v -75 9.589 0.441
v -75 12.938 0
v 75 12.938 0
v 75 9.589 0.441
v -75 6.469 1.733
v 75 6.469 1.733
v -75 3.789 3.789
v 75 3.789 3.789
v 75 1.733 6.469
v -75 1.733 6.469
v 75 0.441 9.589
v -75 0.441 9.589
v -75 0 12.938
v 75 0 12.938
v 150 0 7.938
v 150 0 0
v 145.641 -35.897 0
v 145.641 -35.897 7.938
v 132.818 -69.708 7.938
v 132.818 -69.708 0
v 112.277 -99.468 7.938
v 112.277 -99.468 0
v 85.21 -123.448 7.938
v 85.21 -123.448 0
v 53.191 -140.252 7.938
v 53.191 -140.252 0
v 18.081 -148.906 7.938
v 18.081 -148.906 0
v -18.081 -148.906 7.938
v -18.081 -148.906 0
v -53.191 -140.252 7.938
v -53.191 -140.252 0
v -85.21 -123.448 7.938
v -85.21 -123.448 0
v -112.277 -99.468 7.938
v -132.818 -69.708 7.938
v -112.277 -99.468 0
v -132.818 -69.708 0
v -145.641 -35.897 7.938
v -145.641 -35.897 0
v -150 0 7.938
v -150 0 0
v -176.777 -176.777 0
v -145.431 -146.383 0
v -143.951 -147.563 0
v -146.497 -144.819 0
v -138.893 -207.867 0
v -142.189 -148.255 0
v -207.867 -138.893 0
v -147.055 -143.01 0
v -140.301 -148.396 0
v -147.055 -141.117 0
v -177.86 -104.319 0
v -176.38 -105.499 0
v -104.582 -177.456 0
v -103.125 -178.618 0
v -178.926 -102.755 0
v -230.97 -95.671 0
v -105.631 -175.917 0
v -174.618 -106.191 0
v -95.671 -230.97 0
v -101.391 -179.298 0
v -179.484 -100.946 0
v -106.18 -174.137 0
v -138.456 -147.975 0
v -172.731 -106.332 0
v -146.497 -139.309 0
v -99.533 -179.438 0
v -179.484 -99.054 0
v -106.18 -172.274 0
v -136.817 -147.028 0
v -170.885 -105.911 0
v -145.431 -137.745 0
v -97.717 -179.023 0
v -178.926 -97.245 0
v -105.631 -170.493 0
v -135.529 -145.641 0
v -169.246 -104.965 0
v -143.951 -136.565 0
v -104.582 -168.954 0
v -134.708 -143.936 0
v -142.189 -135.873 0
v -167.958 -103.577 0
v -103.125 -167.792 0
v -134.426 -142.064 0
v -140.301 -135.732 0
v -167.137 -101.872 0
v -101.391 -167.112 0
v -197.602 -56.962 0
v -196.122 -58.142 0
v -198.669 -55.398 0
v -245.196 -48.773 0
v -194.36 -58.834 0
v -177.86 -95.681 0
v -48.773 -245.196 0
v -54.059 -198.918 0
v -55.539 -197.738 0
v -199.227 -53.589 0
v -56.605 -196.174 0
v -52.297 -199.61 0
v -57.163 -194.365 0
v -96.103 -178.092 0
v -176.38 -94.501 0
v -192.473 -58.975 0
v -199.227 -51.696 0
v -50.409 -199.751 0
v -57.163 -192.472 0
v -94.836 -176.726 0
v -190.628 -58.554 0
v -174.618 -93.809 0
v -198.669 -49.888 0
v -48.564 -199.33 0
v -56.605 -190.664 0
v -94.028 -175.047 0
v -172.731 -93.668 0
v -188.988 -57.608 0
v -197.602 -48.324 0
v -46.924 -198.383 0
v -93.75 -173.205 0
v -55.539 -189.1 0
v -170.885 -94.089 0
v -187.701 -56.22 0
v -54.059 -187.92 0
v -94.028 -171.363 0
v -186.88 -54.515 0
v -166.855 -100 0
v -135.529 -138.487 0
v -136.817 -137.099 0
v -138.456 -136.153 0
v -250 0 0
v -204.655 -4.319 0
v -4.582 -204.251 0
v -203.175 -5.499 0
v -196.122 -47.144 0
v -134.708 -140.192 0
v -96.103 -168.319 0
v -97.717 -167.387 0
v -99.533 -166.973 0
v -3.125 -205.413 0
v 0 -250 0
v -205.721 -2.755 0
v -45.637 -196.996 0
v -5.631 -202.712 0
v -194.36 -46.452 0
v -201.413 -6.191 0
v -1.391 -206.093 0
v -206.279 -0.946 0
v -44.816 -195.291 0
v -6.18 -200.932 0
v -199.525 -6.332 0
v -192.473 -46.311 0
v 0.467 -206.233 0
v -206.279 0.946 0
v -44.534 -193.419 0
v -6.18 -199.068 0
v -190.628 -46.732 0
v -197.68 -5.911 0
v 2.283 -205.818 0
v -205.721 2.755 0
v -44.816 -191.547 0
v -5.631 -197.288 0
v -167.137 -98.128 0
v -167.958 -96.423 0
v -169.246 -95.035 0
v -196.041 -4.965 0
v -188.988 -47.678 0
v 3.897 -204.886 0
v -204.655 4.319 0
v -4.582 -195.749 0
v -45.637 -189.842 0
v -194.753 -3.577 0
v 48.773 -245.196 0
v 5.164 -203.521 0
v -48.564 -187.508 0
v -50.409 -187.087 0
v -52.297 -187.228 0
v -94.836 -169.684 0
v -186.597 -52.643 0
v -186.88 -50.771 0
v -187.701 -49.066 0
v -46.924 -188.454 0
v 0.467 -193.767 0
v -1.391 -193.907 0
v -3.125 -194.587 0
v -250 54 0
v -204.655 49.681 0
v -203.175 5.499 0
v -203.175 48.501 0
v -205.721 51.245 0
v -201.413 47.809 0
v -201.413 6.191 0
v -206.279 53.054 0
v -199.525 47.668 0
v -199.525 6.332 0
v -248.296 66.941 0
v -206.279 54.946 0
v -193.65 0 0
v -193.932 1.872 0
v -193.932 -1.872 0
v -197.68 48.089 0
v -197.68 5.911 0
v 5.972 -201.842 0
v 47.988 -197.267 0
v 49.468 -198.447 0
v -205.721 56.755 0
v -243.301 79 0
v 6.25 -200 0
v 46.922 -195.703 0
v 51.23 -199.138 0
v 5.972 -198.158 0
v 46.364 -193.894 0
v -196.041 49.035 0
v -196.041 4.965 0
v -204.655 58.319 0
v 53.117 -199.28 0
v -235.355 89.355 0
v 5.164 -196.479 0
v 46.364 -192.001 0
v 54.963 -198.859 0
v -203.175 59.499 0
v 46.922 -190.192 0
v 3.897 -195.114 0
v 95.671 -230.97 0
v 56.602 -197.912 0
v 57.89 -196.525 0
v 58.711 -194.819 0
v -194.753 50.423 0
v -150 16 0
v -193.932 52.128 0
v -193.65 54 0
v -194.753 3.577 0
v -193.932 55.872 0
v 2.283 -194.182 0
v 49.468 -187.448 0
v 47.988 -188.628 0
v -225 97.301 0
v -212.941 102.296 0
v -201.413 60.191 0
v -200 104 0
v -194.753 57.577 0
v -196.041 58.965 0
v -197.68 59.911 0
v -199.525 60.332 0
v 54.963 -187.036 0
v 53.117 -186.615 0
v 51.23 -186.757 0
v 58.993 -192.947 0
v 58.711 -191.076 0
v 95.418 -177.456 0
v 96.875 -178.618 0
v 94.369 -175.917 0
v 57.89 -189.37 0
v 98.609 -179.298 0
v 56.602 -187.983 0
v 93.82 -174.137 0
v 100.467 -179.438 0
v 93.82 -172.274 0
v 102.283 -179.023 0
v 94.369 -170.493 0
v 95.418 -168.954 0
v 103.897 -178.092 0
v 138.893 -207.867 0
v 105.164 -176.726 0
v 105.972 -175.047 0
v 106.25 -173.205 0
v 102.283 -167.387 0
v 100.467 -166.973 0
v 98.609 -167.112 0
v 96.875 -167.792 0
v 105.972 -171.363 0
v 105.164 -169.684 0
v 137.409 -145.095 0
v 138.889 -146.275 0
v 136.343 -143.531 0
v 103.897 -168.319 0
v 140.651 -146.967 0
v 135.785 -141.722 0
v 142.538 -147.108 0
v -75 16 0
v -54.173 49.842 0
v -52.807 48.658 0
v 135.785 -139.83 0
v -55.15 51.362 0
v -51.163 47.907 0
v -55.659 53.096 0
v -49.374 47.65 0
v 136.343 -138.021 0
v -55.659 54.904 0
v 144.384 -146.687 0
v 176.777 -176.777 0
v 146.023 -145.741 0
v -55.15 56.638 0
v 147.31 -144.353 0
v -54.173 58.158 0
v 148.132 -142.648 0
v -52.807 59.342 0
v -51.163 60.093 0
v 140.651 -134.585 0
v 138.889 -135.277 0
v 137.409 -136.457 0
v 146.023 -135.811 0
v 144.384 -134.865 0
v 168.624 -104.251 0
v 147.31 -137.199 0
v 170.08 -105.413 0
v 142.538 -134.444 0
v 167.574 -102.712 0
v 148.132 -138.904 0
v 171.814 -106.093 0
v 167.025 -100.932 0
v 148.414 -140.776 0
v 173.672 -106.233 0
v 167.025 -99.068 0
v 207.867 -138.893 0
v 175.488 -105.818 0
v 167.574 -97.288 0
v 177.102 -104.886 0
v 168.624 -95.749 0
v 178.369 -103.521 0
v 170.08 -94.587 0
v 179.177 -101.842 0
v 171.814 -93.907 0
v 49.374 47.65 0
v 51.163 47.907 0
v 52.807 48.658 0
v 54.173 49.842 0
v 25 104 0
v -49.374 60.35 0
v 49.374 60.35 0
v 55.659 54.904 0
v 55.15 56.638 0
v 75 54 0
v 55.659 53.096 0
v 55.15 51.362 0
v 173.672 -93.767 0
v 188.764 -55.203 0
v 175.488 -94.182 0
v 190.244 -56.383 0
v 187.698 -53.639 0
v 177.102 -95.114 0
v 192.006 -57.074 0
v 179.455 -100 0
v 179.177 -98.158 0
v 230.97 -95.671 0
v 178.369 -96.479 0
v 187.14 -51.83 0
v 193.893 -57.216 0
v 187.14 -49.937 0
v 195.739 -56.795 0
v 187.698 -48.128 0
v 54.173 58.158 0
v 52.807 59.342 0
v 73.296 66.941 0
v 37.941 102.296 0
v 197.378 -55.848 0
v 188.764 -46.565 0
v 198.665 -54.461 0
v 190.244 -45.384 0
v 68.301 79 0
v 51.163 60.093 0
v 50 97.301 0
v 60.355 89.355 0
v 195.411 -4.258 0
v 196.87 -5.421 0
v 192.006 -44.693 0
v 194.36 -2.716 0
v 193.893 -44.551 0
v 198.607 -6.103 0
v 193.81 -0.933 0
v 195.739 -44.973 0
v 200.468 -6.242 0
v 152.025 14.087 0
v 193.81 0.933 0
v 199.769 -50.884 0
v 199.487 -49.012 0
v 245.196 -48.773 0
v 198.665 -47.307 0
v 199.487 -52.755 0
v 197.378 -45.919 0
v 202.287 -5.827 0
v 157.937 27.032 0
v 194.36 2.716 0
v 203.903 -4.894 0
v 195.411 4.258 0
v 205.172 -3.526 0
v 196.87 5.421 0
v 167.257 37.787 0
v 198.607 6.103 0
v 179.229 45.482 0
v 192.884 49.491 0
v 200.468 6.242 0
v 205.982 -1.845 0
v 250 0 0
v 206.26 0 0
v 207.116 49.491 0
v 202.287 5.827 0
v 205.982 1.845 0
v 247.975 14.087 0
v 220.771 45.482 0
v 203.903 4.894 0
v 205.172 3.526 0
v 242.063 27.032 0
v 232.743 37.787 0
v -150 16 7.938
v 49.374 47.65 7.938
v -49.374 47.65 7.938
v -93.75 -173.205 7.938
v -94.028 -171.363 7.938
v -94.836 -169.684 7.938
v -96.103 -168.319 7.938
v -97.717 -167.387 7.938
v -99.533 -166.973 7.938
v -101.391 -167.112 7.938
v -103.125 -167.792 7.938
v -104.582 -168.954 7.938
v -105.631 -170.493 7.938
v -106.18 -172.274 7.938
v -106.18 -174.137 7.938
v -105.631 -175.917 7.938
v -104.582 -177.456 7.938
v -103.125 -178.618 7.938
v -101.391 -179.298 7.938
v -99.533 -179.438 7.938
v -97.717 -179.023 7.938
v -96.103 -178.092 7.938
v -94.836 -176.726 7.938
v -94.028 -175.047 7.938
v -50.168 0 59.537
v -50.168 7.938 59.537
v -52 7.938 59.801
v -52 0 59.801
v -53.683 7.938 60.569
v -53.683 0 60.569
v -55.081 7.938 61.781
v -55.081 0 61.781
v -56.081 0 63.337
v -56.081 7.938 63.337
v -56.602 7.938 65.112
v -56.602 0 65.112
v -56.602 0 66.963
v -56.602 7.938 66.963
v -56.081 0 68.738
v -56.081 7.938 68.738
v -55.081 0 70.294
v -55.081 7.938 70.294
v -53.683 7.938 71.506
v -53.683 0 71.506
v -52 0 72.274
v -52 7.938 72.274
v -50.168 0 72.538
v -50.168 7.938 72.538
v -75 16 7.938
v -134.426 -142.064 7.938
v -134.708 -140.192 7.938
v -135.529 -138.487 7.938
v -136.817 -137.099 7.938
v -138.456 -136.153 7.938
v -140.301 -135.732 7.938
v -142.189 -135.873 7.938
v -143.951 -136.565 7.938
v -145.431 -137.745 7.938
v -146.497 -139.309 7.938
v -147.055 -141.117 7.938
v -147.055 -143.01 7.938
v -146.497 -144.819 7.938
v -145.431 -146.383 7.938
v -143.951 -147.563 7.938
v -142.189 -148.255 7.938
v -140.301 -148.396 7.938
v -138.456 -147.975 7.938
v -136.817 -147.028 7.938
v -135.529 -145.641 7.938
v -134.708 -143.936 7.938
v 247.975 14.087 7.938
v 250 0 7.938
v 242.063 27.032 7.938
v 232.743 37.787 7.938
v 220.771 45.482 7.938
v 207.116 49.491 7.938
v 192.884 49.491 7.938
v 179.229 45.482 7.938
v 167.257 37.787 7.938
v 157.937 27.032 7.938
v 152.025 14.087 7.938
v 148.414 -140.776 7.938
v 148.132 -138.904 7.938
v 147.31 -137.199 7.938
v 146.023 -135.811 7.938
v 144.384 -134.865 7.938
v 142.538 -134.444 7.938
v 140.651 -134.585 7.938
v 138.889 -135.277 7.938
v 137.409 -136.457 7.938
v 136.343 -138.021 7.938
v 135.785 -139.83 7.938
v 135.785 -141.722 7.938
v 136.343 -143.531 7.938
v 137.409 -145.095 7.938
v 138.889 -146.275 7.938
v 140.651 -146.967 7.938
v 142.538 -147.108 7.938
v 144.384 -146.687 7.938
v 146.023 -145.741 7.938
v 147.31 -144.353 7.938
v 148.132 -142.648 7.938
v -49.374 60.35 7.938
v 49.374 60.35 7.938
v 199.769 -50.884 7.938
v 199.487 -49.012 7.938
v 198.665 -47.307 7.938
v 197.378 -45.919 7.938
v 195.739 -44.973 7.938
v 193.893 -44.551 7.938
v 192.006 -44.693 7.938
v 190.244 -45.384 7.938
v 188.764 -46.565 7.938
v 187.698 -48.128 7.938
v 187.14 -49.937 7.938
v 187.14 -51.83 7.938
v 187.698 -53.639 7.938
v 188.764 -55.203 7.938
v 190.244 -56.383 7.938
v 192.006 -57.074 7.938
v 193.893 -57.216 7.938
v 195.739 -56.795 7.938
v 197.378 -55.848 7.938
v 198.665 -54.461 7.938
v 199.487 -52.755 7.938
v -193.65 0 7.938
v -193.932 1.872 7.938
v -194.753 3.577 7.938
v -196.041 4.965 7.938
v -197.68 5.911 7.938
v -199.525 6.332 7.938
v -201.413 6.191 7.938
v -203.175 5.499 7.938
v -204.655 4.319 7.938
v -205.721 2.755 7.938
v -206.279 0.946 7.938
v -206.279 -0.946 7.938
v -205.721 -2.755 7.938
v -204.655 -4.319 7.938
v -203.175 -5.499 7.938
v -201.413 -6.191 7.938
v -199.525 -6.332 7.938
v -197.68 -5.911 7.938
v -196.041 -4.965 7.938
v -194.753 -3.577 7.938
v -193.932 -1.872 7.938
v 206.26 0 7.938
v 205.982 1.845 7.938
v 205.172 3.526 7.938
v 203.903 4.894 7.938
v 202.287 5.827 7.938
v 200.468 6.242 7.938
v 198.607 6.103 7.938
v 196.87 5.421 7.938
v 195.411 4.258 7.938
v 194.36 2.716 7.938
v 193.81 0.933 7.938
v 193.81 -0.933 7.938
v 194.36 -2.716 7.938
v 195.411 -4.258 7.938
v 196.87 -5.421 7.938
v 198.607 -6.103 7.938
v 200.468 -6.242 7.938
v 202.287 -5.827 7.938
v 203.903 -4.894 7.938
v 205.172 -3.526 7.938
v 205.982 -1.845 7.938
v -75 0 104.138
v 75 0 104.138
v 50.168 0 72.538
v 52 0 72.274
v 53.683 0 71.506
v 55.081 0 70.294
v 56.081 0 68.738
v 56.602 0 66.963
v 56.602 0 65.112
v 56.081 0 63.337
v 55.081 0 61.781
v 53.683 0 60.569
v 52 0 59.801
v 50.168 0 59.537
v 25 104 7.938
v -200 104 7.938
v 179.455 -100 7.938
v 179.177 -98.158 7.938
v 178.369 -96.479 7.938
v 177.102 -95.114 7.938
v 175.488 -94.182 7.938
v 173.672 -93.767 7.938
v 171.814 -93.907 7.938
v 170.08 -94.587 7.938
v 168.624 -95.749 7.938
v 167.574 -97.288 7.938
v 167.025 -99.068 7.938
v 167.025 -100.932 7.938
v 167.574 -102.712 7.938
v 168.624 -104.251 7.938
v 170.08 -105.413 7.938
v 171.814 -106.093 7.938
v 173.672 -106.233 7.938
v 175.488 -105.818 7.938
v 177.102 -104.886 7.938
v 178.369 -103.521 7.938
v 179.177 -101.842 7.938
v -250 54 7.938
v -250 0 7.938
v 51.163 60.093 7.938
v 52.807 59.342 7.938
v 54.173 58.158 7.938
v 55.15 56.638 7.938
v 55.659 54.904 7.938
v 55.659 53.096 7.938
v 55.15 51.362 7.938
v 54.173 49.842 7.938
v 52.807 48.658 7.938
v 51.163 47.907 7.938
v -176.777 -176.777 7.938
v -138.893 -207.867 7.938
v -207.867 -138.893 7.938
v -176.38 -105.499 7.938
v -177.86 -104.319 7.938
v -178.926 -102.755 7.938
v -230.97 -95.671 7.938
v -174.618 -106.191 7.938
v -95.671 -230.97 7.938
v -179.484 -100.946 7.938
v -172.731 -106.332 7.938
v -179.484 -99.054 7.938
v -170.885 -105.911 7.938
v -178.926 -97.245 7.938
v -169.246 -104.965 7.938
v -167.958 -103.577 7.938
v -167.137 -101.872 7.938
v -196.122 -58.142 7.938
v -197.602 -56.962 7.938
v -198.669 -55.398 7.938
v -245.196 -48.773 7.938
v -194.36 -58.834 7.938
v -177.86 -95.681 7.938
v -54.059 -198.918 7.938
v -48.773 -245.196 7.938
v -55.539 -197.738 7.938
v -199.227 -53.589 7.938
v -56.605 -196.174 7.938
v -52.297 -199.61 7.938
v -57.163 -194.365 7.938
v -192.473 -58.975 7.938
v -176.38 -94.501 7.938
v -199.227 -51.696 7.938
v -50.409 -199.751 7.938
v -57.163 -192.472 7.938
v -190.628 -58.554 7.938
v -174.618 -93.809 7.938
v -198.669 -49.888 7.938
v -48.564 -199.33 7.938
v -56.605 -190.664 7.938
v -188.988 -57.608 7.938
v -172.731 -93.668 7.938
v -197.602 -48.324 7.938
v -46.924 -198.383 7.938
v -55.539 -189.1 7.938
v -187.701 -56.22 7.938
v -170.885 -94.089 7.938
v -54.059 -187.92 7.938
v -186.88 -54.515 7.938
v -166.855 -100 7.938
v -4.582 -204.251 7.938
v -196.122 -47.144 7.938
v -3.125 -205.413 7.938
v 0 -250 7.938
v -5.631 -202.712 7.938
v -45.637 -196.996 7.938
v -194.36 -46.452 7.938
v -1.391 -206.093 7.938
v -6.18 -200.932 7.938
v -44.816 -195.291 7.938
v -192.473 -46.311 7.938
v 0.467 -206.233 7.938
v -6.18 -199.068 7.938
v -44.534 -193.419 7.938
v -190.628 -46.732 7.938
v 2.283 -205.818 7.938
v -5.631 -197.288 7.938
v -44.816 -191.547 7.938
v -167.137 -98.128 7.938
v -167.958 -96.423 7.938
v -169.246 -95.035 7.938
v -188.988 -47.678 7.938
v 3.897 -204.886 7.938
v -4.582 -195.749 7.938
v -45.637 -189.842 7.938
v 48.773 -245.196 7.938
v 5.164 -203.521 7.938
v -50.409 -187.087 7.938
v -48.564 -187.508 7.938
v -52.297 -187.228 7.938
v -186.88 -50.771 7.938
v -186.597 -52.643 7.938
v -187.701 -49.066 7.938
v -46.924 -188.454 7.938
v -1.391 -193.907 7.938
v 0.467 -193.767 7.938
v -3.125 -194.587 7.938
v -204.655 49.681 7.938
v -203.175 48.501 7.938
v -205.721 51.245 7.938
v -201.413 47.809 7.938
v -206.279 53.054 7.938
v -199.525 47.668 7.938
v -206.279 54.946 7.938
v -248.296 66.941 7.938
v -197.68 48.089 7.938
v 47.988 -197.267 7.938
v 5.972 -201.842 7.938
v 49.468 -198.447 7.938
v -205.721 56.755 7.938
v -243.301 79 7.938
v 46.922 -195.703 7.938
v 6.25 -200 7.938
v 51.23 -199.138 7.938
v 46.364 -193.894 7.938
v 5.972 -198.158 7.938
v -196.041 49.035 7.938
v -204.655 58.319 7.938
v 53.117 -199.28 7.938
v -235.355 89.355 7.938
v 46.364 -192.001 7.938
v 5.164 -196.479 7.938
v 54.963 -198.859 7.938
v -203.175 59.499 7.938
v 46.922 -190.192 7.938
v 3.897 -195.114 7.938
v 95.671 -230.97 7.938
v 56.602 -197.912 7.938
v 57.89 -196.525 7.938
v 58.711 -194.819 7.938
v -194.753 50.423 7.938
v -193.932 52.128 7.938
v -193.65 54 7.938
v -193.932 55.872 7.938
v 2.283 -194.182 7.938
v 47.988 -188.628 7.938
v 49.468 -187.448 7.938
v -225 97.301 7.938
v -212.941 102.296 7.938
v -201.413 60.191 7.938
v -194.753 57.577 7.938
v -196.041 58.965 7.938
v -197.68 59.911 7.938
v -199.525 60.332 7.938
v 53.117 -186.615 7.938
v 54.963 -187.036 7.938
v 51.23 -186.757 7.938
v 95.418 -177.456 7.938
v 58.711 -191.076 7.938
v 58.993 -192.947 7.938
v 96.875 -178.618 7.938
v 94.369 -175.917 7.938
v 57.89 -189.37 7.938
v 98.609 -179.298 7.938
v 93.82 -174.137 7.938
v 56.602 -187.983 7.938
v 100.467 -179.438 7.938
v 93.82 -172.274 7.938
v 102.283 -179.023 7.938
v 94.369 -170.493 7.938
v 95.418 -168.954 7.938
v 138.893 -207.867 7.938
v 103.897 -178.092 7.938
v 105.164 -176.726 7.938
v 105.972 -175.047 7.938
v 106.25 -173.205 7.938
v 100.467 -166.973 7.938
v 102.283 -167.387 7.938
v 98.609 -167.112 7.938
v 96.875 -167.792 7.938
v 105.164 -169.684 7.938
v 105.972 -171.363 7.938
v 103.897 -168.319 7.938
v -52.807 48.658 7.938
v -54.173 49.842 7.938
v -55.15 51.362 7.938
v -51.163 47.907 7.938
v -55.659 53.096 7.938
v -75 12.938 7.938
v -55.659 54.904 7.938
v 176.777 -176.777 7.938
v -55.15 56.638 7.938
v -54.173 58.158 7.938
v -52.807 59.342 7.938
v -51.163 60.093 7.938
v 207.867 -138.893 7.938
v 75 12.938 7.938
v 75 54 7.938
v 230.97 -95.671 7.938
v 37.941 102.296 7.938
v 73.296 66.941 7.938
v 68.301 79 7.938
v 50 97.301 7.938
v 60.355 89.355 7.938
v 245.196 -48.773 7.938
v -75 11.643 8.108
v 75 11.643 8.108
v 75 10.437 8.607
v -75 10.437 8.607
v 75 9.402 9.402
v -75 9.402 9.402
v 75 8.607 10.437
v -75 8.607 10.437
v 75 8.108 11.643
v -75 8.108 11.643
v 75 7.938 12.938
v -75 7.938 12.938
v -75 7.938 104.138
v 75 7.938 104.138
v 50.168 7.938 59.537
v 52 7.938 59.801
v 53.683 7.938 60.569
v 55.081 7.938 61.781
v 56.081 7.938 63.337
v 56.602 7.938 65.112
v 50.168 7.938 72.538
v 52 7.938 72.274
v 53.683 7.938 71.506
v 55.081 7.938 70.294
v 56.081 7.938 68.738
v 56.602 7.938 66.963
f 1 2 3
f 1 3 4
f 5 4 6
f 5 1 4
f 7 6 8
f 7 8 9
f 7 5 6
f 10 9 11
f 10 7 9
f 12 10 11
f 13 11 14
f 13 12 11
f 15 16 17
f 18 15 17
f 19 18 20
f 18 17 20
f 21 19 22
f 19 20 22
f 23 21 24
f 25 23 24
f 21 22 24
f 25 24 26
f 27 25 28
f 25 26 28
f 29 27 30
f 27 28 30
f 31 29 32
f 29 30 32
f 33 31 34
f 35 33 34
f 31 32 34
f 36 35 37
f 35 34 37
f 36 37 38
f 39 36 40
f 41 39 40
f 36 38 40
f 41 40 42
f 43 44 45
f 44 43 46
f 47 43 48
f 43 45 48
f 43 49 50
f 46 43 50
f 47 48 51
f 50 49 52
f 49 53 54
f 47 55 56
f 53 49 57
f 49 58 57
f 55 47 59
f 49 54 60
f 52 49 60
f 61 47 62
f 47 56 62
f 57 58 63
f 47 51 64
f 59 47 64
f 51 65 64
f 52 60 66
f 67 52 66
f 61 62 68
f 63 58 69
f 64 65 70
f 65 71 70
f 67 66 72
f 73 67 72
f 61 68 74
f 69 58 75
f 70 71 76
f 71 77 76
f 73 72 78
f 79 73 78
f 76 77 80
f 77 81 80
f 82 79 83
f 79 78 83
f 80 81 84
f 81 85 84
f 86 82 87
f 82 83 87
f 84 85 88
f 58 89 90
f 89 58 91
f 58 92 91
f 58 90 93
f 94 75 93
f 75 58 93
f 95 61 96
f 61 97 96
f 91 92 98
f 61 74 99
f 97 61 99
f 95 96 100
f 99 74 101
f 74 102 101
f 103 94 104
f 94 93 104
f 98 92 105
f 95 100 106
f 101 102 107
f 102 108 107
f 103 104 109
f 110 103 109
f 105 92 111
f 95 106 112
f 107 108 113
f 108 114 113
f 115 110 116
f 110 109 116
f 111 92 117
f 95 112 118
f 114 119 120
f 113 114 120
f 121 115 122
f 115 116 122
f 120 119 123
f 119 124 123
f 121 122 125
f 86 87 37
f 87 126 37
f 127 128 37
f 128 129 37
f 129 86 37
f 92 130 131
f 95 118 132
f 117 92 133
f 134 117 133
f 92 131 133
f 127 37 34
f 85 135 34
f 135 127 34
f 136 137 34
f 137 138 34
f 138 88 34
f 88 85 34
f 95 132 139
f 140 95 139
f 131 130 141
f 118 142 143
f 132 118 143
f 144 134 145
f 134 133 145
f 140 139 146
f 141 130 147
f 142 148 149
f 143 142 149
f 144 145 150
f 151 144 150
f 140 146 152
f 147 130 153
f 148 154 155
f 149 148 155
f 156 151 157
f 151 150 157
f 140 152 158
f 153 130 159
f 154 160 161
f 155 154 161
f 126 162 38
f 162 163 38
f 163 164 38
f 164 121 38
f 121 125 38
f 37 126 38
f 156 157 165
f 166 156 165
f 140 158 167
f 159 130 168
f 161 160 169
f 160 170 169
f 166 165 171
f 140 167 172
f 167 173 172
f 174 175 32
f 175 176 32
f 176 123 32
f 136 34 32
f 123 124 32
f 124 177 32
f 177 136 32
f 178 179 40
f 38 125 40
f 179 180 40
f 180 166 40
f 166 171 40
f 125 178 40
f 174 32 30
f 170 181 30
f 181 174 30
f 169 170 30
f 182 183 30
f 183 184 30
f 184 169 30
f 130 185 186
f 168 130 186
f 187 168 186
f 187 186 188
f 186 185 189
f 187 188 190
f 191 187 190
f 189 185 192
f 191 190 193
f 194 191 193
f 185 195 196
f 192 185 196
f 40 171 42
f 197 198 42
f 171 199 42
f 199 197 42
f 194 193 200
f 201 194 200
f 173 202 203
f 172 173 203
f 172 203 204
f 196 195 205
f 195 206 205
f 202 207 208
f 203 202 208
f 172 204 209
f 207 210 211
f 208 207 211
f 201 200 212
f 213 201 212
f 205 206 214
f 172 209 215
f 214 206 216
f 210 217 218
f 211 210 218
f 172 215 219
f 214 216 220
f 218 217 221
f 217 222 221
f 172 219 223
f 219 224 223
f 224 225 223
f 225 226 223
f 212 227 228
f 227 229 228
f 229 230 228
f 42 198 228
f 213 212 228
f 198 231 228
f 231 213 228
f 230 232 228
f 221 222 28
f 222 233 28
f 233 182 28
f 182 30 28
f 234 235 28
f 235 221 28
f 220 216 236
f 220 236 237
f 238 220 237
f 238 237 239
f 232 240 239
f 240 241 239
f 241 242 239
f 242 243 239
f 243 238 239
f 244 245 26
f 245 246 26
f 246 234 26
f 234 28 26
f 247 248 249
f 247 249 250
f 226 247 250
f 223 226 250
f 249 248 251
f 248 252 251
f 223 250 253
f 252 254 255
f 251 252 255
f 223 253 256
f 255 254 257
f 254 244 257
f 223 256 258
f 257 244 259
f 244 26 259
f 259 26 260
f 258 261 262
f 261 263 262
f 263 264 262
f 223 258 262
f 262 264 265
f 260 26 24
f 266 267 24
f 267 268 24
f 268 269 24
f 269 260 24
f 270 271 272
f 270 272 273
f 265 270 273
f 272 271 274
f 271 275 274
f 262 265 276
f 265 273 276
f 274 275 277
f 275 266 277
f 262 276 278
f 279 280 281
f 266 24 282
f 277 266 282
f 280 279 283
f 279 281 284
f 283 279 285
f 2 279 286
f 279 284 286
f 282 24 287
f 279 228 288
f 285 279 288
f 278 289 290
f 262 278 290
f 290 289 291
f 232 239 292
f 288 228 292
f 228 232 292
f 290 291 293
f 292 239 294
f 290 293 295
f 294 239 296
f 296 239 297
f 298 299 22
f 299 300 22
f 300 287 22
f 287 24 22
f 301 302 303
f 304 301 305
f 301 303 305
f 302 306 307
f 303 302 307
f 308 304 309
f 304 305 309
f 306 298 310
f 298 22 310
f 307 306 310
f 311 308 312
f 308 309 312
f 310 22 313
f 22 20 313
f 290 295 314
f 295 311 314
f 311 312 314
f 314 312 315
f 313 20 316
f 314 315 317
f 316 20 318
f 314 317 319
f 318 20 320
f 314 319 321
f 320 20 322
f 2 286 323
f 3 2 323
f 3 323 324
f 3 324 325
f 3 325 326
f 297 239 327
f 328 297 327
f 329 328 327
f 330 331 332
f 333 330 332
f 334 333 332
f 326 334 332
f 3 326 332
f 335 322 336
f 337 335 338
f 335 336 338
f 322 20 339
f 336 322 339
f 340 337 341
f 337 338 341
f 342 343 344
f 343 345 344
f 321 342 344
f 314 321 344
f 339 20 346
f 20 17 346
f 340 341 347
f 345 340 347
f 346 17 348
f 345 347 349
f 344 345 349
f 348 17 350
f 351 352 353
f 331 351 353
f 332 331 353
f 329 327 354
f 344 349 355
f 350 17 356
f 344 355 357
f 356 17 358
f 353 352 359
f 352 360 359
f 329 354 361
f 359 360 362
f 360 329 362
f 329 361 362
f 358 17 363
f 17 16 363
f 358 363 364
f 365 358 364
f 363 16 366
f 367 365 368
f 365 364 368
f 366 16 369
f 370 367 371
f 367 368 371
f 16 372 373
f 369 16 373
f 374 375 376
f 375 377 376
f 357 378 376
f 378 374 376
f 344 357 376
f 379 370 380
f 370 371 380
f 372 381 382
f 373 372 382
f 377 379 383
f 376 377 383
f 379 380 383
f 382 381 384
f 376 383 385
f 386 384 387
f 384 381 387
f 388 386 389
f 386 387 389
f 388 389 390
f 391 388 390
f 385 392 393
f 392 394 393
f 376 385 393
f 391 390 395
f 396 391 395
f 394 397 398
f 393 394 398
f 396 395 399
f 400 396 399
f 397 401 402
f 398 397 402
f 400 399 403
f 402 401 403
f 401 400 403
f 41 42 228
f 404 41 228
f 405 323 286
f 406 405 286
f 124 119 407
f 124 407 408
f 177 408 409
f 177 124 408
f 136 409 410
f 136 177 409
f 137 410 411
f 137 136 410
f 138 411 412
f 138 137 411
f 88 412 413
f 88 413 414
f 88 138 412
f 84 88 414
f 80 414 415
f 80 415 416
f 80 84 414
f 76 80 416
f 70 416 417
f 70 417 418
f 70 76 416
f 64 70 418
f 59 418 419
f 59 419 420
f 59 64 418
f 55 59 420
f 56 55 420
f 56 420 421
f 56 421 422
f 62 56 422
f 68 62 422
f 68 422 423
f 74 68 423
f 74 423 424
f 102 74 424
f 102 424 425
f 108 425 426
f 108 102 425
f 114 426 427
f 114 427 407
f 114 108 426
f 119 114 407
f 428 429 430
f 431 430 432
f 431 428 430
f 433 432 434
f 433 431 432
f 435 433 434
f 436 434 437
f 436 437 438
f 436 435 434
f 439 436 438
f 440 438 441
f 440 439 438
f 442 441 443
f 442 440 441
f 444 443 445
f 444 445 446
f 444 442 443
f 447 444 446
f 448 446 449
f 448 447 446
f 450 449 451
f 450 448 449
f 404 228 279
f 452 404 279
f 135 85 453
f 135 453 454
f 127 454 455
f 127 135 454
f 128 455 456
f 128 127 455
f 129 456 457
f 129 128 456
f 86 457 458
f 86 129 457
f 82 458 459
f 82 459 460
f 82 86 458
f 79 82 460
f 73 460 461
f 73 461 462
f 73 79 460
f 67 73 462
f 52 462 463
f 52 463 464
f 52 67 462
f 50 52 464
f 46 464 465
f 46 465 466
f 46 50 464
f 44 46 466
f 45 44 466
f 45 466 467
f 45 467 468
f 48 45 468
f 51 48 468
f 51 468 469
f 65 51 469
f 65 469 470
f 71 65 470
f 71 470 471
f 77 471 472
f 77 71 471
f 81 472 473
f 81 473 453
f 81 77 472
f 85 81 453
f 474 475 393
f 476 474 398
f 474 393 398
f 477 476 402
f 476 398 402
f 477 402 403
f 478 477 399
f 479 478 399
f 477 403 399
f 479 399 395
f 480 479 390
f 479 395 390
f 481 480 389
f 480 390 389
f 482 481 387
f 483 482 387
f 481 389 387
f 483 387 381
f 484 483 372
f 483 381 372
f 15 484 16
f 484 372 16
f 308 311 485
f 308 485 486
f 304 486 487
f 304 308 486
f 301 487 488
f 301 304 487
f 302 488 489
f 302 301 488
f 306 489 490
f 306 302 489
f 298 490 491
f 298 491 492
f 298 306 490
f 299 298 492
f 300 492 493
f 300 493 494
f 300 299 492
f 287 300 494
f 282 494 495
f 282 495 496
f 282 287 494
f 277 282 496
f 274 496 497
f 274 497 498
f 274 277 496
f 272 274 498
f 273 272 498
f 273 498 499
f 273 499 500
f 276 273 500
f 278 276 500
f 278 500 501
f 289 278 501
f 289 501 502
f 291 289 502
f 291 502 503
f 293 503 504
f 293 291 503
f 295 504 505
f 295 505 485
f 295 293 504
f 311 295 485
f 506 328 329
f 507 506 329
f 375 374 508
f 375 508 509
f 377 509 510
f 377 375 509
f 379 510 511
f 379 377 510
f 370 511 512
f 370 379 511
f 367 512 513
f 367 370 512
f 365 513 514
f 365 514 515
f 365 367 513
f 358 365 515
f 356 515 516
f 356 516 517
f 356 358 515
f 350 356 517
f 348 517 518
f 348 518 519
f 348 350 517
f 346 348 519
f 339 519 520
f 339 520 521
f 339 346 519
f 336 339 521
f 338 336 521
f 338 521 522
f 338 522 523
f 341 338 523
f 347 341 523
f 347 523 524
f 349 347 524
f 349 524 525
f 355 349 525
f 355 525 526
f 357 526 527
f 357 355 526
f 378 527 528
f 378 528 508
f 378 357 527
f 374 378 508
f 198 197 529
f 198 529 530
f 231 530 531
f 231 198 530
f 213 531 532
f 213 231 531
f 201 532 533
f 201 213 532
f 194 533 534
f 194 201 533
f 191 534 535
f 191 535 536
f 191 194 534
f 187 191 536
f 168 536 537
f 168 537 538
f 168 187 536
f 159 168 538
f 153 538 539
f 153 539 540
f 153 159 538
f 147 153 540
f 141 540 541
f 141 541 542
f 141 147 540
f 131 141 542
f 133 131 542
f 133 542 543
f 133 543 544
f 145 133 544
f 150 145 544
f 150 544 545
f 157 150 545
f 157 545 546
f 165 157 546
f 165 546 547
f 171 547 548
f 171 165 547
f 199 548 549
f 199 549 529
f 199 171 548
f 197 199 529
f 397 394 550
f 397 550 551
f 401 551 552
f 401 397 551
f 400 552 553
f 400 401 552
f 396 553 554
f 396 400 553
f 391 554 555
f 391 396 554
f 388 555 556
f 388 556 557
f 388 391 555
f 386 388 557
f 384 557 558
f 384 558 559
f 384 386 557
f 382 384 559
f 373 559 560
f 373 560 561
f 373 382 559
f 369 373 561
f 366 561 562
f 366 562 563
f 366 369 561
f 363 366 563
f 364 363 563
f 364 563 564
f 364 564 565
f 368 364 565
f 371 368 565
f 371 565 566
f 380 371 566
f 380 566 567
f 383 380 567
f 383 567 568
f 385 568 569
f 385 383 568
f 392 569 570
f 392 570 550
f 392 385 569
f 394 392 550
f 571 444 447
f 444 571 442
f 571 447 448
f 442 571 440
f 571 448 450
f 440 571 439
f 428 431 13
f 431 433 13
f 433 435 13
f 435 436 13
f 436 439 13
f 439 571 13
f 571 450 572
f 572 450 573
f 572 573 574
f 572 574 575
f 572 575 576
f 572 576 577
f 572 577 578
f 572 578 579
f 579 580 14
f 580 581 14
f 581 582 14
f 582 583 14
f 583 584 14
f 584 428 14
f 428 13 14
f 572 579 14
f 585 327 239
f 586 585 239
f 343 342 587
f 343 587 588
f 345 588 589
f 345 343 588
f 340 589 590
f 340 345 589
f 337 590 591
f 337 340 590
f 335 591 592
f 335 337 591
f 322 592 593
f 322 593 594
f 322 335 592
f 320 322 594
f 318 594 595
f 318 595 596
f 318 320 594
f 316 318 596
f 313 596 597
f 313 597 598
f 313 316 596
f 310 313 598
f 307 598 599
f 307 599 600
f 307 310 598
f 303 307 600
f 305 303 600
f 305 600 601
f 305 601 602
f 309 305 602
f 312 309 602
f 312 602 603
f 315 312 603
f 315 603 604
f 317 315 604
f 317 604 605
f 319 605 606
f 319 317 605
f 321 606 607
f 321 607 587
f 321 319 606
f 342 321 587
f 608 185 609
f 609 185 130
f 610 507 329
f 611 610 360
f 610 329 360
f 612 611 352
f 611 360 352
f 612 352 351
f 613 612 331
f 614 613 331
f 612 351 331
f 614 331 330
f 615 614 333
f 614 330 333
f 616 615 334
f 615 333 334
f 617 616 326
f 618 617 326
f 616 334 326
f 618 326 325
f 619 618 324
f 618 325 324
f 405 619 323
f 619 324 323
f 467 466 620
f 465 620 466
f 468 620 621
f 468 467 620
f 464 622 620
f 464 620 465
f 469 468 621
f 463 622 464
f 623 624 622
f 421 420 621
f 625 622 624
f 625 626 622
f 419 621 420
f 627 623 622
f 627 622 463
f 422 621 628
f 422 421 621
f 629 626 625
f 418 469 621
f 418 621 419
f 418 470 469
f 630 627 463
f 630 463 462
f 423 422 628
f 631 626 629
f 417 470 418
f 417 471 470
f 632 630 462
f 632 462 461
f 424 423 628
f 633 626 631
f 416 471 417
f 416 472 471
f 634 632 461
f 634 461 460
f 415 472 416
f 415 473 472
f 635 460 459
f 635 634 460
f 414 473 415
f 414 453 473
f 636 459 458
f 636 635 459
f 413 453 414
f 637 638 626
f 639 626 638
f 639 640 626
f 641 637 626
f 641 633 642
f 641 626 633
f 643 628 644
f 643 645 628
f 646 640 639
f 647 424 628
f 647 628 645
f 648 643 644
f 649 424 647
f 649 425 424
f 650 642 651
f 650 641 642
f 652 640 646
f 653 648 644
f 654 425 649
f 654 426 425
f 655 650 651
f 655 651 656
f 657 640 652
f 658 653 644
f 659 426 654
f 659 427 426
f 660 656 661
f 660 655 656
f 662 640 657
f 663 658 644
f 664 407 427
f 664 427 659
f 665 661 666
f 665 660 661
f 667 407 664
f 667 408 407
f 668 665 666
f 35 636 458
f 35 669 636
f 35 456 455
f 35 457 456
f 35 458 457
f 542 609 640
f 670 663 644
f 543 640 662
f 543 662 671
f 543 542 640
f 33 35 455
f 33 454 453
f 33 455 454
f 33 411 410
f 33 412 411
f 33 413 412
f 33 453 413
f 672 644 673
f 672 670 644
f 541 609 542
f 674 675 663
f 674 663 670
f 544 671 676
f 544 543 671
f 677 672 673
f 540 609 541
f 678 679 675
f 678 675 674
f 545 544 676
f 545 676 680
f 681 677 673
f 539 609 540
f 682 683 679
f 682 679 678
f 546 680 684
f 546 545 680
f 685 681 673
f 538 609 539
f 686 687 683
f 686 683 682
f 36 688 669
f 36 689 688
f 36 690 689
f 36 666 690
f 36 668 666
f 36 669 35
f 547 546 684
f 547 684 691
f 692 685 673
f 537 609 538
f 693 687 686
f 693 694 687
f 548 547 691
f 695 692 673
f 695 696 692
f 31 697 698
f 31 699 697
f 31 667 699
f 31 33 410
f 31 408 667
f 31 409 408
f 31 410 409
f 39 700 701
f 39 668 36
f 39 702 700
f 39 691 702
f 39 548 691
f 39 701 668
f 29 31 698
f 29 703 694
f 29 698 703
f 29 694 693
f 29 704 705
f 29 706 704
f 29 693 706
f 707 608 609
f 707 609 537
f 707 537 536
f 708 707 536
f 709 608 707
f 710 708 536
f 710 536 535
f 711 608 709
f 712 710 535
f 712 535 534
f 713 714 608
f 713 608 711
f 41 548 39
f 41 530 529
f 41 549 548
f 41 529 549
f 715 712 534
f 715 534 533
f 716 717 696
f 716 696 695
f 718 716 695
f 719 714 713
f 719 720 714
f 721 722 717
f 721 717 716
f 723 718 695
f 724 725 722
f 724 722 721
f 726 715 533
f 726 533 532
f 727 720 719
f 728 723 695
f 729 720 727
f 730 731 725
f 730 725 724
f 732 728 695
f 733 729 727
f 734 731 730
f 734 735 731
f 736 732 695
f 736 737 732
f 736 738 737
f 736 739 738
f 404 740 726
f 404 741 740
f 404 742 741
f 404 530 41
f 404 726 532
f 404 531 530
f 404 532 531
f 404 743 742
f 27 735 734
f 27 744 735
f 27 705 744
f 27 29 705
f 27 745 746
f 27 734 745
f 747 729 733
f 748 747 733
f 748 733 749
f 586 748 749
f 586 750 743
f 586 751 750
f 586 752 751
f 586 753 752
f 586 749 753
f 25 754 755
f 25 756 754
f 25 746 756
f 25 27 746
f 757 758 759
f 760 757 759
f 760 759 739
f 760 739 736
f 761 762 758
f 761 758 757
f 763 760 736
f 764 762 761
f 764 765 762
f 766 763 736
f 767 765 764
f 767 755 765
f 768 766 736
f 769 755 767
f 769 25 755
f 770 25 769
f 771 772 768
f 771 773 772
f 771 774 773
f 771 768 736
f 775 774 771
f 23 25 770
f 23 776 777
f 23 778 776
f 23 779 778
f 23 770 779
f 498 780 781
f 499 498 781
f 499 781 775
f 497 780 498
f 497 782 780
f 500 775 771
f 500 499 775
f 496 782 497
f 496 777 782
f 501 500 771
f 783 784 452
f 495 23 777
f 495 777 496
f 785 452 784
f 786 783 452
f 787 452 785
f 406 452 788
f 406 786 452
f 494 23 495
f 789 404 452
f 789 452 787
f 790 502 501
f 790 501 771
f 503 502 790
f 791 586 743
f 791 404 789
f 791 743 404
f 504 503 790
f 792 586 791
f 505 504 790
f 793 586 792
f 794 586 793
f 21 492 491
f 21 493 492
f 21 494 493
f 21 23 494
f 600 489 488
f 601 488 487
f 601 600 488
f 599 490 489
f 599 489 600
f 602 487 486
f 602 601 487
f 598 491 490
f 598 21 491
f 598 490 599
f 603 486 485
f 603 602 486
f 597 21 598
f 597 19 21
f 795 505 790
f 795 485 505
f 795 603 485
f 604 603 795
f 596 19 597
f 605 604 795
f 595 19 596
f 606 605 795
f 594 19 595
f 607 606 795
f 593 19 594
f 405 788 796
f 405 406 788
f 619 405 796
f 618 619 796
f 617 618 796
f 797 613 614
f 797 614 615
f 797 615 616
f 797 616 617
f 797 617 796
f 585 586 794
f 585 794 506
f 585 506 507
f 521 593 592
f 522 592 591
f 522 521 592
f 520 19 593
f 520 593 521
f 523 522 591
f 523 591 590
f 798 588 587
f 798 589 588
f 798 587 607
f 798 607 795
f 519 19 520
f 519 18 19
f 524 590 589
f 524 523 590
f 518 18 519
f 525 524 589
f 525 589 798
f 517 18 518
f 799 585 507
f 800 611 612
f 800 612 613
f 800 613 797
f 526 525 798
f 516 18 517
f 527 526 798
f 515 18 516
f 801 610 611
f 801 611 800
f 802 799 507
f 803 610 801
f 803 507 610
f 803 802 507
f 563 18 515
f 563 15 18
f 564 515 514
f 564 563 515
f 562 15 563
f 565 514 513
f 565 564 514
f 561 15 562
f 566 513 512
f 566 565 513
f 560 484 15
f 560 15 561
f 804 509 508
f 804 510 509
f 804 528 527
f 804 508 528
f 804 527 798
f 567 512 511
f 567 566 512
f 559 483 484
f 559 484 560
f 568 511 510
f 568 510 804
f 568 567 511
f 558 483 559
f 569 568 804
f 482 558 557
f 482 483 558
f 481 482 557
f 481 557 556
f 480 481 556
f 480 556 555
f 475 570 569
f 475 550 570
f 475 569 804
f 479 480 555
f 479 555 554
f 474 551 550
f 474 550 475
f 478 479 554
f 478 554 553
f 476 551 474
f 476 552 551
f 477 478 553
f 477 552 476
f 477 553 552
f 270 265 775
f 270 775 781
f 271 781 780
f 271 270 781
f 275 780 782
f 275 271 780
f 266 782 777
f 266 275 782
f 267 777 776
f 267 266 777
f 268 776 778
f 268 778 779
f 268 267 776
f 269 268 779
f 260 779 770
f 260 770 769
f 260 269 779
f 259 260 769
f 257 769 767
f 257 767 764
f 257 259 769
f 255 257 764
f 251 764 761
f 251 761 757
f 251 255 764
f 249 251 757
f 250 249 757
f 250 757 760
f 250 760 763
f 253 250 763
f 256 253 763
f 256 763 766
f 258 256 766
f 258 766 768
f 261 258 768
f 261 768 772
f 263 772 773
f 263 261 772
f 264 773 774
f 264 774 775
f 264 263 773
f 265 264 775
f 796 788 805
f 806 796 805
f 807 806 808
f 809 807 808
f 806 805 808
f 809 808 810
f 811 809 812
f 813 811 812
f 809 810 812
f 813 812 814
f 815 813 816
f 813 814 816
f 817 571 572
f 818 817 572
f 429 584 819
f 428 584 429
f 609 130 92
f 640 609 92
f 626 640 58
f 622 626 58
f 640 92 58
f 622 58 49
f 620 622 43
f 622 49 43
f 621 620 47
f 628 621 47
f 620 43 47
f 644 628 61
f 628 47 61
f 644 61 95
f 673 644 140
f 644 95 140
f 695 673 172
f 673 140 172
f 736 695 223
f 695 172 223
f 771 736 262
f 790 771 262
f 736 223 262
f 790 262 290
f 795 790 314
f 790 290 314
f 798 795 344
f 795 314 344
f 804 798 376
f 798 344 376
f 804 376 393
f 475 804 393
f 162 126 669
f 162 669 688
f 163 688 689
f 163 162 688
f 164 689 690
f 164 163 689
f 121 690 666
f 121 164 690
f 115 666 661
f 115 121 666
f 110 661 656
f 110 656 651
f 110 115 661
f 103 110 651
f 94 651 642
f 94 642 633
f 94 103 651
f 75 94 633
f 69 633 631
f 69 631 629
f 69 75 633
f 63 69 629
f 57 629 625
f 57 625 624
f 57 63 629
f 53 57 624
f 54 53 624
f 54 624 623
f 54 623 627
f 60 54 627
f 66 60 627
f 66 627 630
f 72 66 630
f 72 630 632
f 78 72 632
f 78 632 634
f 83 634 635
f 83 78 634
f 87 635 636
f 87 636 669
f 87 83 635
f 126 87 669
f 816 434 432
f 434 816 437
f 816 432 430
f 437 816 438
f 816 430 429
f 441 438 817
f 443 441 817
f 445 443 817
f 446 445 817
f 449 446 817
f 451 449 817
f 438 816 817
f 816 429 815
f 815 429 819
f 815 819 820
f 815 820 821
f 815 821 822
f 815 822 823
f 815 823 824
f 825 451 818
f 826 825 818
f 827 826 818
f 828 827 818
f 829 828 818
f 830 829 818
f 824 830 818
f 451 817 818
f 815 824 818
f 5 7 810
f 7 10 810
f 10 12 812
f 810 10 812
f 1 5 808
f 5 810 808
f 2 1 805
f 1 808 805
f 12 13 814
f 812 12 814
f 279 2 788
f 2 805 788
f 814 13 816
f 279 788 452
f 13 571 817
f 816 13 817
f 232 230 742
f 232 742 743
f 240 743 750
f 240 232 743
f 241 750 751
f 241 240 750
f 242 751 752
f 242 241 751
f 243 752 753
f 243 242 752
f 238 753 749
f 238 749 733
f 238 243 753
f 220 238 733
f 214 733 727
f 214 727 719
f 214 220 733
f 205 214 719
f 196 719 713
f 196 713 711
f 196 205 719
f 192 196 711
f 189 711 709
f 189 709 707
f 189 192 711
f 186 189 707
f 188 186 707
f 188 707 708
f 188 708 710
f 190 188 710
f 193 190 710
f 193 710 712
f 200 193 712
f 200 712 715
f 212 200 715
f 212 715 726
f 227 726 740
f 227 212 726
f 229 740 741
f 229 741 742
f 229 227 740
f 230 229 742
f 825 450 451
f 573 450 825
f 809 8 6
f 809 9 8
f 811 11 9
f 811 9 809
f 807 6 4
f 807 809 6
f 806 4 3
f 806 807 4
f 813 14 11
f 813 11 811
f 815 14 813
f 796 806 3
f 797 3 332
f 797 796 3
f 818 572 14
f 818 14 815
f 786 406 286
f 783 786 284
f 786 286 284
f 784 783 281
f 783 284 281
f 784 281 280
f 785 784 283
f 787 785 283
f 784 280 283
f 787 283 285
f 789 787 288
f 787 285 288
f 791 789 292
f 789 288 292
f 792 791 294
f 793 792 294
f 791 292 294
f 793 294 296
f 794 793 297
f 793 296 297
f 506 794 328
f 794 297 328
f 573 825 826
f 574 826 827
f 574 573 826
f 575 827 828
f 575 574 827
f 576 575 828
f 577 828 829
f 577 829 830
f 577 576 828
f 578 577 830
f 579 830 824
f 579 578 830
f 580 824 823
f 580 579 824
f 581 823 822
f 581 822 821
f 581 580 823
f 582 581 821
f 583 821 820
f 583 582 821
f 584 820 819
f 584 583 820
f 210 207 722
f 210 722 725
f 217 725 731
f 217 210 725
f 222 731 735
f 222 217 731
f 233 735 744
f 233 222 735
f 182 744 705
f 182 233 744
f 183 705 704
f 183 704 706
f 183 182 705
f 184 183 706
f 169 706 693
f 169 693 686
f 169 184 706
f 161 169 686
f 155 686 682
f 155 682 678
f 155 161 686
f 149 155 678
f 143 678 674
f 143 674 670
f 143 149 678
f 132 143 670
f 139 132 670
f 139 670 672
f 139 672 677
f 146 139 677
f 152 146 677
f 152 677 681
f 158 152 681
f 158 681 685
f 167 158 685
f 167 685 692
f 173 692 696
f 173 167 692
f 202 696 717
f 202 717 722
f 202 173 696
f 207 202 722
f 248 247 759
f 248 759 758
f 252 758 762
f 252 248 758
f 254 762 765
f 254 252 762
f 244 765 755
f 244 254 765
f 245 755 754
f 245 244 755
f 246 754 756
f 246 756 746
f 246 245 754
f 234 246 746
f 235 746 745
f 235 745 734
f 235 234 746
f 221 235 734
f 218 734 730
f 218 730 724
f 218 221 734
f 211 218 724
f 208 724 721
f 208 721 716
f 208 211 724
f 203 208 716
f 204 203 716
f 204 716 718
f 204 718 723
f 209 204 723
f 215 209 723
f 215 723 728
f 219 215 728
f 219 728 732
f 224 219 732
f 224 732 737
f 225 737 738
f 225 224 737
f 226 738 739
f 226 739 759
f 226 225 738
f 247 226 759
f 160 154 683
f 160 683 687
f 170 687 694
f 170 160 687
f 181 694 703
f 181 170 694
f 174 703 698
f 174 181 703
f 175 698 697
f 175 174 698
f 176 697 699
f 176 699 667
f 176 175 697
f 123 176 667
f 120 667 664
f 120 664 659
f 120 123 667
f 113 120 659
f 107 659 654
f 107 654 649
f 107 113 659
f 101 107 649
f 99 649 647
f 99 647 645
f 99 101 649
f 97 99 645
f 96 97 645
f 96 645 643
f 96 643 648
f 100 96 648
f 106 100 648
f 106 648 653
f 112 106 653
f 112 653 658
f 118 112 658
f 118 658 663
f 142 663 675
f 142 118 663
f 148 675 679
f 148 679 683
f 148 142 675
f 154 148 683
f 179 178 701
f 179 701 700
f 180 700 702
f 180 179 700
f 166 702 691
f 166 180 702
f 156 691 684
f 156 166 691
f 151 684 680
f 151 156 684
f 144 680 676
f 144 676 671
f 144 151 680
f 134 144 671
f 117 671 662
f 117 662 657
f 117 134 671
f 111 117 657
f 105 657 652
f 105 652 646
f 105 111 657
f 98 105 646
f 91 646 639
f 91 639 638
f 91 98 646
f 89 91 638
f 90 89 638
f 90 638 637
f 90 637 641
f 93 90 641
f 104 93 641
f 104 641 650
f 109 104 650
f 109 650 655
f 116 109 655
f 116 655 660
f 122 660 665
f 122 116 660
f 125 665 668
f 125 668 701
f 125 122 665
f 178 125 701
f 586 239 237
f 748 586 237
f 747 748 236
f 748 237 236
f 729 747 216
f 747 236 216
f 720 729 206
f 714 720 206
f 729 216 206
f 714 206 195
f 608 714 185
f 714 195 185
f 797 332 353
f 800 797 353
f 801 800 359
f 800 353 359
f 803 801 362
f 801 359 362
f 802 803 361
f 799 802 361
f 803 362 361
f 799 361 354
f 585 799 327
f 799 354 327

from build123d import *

# Parameters (mm, degrees)
CROQUIS1_R                = 6.35
CROQUIS1_R_2              = 6.26
CROQUIS1_R_3              = 6.25
SALIENTE_EXTRUIR1_DEPTH   = 7.9375
CROQUIS2_W                = 150
CROQUIS2_H                = 104.1375
SALIENTE_EXTRUIR2_DEPTH   = 7.9375
CONVERTIR_S_LIDO4_START   = -75
CONVERTIR_S_LIDO4_DEPTH   = 150
CONVERTIR_S_LIDO4_2_DEPTH = 150


# Read off the part's stored shape, not the designer's step: Convertir-Sólido4
with BuildPart() as part:
    # Croquis1 → Saliente-Extruir1 (new body)
    with BuildSketch(Plane.XY):
        with BuildLine():
            Line((-75, 16), (-75, 0))
            Line((-75, 0), (75, 0))
            Line((75, 0), (75, 54))
            ThreePointArc((75, 54), (60.355339059, 89.355339059), (25, 104))
            Line((25, 104), (-200, 104))
            ThreePointArc((-200, 104), (-235.355339059, 89.355339059), (-250, 54))
            Line((-250, 54), (-250, 0))
            ThreePointArc((-250, 0), (0, -250), (250, 0))
            ThreePointArc((250, 0), (200, 50), (150, 0))
            ThreePointArc((150, 0), (0, -150), (-150, 0))
            Line((-150, 0), (-150, 16))
            Line((-150, 16), (-75, 16))
        make_face()
        with BuildLine():
            ThreePointArc((-49.374105038, 47.65), (-55.724105038, 54), (-49.374105038, 60.35))
            Line((-49.374105038, 60.35), (49.374105038, 60.35))
            ThreePointArc((49.374105038, 60.35), (55.724105038, 54), (49.374105038, 47.65))
            Line((49.374105038, 47.65), (-49.374105038, 47.65))
        make_face(mode=Mode.SUBTRACT)
        with Locations((193.418858597, -50.883643138)):
            Circle(CROQUIS1_R, mode=Mode.SUBTRACT)
        with Locations((200, 0)):
            Circle(CROQUIS1_R_2, mode=Mode.SUBTRACT)
        with Locations((-100, -173.205080757)):
            Circle(CROQUIS1_R_3, mode=Mode.SUBTRACT)
        with Locations((-50.883643138, -193.418858597)):
            Circle(CROQUIS1_R, mode=Mode.SUBTRACT)
        with Locations((-140.775956893, -142.063823547)):
            Circle(CROQUIS1_R, mode=Mode.SUBTRACT)
        with Locations((-173.205080757, -100)):
            Circle(CROQUIS1_R, mode=Mode.SUBTRACT)
        with Locations((0, -200)):
            Circle(CROQUIS1_R_3, mode=Mode.SUBTRACT)
        with Locations((52.642901704, -192.947466685)):
            Circle(CROQUIS1_R, mode=Mode.SUBTRACT)
        with Locations((100, -173.205080757)):
            Circle(CROQUIS1_R_3, mode=Mode.SUBTRACT)
        with Locations((142.063823547, -140.775956893)):
            Circle(CROQUIS1_R, mode=Mode.SUBTRACT)
        with Locations((173.205080757, -100)):
            Circle(CROQUIS1_R_3, mode=Mode.SUBTRACT)
        with Locations((-192.947466685, -52.642901704)):
            Circle(CROQUIS1_R, mode=Mode.SUBTRACT)
        with Locations((-200, 0)):
            Circle(CROQUIS1_R, mode=Mode.SUBTRACT)
        with Locations((-200, 54)):
            Circle(CROQUIS1_R, mode=Mode.SUBTRACT)
    extrude(amount=SALIENTE_EXTRUIR1_DEPTH)

    # Croquis2 → Saliente-Extruir2 (add)
    with BuildSketch(Plane.XZ):
        with Locations((0, 52.06875)):
            Rectangle(CROQUIS2_W, CROQUIS2_H)
        with BuildLine():
            Line((-50.16849794, 72.5375), (50.16849794, 72.5375))
            ThreePointArc((50.16849794, 72.5375), (56.66849794, 66.0375), (50.16849794, 59.5375))
            Line((50.16849794, 59.5375), (-50.16849794, 59.5375))
            ThreePointArc((-50.16849794, 59.5375), (-56.66849794, 66.0375), (-50.16849794, 72.5375))
        make_face(mode=Mode.SUBTRACT)
    extrude(amount=-SALIENTE_EXTRUIR2_DEPTH)

    # Convertir-Sólido4 outline → Convertir-Sólido4 (cut)
    with BuildSketch(Plane.YZ.offset(CONVERTIR_S_LIDO4_START)):
        with BuildLine():
            Line((0, 12.9375), (0, 0))
            Line((0, 0), (12.9375, 0))
            ThreePointArc((12.9375, 0), (3.789306018, 3.789306018), (0, 12.9375))
        make_face()
    extrude(amount=CONVERTIR_S_LIDO4_DEPTH, mode=Mode.SUBTRACT)

    # Convertir-S_lido4 2 outline → Convertir-S_lido4 2 (add)
    with BuildSketch(Plane.YZ.offset(CONVERTIR_S_LIDO4_START)):
        with BuildLine():
            Line((7.9375, 12.9375), (7.9375, 7.9375))
            Line((7.9375, 7.9375), (12.9375, 7.9375))
            ThreePointArc((12.9375, 7.9375), (9.401966094, 9.401966094), (7.9375, 12.9375))
        make_face()
    extrude(amount=CONVERTIR_S_LIDO4_2_DEPTH)


solid = part.part
